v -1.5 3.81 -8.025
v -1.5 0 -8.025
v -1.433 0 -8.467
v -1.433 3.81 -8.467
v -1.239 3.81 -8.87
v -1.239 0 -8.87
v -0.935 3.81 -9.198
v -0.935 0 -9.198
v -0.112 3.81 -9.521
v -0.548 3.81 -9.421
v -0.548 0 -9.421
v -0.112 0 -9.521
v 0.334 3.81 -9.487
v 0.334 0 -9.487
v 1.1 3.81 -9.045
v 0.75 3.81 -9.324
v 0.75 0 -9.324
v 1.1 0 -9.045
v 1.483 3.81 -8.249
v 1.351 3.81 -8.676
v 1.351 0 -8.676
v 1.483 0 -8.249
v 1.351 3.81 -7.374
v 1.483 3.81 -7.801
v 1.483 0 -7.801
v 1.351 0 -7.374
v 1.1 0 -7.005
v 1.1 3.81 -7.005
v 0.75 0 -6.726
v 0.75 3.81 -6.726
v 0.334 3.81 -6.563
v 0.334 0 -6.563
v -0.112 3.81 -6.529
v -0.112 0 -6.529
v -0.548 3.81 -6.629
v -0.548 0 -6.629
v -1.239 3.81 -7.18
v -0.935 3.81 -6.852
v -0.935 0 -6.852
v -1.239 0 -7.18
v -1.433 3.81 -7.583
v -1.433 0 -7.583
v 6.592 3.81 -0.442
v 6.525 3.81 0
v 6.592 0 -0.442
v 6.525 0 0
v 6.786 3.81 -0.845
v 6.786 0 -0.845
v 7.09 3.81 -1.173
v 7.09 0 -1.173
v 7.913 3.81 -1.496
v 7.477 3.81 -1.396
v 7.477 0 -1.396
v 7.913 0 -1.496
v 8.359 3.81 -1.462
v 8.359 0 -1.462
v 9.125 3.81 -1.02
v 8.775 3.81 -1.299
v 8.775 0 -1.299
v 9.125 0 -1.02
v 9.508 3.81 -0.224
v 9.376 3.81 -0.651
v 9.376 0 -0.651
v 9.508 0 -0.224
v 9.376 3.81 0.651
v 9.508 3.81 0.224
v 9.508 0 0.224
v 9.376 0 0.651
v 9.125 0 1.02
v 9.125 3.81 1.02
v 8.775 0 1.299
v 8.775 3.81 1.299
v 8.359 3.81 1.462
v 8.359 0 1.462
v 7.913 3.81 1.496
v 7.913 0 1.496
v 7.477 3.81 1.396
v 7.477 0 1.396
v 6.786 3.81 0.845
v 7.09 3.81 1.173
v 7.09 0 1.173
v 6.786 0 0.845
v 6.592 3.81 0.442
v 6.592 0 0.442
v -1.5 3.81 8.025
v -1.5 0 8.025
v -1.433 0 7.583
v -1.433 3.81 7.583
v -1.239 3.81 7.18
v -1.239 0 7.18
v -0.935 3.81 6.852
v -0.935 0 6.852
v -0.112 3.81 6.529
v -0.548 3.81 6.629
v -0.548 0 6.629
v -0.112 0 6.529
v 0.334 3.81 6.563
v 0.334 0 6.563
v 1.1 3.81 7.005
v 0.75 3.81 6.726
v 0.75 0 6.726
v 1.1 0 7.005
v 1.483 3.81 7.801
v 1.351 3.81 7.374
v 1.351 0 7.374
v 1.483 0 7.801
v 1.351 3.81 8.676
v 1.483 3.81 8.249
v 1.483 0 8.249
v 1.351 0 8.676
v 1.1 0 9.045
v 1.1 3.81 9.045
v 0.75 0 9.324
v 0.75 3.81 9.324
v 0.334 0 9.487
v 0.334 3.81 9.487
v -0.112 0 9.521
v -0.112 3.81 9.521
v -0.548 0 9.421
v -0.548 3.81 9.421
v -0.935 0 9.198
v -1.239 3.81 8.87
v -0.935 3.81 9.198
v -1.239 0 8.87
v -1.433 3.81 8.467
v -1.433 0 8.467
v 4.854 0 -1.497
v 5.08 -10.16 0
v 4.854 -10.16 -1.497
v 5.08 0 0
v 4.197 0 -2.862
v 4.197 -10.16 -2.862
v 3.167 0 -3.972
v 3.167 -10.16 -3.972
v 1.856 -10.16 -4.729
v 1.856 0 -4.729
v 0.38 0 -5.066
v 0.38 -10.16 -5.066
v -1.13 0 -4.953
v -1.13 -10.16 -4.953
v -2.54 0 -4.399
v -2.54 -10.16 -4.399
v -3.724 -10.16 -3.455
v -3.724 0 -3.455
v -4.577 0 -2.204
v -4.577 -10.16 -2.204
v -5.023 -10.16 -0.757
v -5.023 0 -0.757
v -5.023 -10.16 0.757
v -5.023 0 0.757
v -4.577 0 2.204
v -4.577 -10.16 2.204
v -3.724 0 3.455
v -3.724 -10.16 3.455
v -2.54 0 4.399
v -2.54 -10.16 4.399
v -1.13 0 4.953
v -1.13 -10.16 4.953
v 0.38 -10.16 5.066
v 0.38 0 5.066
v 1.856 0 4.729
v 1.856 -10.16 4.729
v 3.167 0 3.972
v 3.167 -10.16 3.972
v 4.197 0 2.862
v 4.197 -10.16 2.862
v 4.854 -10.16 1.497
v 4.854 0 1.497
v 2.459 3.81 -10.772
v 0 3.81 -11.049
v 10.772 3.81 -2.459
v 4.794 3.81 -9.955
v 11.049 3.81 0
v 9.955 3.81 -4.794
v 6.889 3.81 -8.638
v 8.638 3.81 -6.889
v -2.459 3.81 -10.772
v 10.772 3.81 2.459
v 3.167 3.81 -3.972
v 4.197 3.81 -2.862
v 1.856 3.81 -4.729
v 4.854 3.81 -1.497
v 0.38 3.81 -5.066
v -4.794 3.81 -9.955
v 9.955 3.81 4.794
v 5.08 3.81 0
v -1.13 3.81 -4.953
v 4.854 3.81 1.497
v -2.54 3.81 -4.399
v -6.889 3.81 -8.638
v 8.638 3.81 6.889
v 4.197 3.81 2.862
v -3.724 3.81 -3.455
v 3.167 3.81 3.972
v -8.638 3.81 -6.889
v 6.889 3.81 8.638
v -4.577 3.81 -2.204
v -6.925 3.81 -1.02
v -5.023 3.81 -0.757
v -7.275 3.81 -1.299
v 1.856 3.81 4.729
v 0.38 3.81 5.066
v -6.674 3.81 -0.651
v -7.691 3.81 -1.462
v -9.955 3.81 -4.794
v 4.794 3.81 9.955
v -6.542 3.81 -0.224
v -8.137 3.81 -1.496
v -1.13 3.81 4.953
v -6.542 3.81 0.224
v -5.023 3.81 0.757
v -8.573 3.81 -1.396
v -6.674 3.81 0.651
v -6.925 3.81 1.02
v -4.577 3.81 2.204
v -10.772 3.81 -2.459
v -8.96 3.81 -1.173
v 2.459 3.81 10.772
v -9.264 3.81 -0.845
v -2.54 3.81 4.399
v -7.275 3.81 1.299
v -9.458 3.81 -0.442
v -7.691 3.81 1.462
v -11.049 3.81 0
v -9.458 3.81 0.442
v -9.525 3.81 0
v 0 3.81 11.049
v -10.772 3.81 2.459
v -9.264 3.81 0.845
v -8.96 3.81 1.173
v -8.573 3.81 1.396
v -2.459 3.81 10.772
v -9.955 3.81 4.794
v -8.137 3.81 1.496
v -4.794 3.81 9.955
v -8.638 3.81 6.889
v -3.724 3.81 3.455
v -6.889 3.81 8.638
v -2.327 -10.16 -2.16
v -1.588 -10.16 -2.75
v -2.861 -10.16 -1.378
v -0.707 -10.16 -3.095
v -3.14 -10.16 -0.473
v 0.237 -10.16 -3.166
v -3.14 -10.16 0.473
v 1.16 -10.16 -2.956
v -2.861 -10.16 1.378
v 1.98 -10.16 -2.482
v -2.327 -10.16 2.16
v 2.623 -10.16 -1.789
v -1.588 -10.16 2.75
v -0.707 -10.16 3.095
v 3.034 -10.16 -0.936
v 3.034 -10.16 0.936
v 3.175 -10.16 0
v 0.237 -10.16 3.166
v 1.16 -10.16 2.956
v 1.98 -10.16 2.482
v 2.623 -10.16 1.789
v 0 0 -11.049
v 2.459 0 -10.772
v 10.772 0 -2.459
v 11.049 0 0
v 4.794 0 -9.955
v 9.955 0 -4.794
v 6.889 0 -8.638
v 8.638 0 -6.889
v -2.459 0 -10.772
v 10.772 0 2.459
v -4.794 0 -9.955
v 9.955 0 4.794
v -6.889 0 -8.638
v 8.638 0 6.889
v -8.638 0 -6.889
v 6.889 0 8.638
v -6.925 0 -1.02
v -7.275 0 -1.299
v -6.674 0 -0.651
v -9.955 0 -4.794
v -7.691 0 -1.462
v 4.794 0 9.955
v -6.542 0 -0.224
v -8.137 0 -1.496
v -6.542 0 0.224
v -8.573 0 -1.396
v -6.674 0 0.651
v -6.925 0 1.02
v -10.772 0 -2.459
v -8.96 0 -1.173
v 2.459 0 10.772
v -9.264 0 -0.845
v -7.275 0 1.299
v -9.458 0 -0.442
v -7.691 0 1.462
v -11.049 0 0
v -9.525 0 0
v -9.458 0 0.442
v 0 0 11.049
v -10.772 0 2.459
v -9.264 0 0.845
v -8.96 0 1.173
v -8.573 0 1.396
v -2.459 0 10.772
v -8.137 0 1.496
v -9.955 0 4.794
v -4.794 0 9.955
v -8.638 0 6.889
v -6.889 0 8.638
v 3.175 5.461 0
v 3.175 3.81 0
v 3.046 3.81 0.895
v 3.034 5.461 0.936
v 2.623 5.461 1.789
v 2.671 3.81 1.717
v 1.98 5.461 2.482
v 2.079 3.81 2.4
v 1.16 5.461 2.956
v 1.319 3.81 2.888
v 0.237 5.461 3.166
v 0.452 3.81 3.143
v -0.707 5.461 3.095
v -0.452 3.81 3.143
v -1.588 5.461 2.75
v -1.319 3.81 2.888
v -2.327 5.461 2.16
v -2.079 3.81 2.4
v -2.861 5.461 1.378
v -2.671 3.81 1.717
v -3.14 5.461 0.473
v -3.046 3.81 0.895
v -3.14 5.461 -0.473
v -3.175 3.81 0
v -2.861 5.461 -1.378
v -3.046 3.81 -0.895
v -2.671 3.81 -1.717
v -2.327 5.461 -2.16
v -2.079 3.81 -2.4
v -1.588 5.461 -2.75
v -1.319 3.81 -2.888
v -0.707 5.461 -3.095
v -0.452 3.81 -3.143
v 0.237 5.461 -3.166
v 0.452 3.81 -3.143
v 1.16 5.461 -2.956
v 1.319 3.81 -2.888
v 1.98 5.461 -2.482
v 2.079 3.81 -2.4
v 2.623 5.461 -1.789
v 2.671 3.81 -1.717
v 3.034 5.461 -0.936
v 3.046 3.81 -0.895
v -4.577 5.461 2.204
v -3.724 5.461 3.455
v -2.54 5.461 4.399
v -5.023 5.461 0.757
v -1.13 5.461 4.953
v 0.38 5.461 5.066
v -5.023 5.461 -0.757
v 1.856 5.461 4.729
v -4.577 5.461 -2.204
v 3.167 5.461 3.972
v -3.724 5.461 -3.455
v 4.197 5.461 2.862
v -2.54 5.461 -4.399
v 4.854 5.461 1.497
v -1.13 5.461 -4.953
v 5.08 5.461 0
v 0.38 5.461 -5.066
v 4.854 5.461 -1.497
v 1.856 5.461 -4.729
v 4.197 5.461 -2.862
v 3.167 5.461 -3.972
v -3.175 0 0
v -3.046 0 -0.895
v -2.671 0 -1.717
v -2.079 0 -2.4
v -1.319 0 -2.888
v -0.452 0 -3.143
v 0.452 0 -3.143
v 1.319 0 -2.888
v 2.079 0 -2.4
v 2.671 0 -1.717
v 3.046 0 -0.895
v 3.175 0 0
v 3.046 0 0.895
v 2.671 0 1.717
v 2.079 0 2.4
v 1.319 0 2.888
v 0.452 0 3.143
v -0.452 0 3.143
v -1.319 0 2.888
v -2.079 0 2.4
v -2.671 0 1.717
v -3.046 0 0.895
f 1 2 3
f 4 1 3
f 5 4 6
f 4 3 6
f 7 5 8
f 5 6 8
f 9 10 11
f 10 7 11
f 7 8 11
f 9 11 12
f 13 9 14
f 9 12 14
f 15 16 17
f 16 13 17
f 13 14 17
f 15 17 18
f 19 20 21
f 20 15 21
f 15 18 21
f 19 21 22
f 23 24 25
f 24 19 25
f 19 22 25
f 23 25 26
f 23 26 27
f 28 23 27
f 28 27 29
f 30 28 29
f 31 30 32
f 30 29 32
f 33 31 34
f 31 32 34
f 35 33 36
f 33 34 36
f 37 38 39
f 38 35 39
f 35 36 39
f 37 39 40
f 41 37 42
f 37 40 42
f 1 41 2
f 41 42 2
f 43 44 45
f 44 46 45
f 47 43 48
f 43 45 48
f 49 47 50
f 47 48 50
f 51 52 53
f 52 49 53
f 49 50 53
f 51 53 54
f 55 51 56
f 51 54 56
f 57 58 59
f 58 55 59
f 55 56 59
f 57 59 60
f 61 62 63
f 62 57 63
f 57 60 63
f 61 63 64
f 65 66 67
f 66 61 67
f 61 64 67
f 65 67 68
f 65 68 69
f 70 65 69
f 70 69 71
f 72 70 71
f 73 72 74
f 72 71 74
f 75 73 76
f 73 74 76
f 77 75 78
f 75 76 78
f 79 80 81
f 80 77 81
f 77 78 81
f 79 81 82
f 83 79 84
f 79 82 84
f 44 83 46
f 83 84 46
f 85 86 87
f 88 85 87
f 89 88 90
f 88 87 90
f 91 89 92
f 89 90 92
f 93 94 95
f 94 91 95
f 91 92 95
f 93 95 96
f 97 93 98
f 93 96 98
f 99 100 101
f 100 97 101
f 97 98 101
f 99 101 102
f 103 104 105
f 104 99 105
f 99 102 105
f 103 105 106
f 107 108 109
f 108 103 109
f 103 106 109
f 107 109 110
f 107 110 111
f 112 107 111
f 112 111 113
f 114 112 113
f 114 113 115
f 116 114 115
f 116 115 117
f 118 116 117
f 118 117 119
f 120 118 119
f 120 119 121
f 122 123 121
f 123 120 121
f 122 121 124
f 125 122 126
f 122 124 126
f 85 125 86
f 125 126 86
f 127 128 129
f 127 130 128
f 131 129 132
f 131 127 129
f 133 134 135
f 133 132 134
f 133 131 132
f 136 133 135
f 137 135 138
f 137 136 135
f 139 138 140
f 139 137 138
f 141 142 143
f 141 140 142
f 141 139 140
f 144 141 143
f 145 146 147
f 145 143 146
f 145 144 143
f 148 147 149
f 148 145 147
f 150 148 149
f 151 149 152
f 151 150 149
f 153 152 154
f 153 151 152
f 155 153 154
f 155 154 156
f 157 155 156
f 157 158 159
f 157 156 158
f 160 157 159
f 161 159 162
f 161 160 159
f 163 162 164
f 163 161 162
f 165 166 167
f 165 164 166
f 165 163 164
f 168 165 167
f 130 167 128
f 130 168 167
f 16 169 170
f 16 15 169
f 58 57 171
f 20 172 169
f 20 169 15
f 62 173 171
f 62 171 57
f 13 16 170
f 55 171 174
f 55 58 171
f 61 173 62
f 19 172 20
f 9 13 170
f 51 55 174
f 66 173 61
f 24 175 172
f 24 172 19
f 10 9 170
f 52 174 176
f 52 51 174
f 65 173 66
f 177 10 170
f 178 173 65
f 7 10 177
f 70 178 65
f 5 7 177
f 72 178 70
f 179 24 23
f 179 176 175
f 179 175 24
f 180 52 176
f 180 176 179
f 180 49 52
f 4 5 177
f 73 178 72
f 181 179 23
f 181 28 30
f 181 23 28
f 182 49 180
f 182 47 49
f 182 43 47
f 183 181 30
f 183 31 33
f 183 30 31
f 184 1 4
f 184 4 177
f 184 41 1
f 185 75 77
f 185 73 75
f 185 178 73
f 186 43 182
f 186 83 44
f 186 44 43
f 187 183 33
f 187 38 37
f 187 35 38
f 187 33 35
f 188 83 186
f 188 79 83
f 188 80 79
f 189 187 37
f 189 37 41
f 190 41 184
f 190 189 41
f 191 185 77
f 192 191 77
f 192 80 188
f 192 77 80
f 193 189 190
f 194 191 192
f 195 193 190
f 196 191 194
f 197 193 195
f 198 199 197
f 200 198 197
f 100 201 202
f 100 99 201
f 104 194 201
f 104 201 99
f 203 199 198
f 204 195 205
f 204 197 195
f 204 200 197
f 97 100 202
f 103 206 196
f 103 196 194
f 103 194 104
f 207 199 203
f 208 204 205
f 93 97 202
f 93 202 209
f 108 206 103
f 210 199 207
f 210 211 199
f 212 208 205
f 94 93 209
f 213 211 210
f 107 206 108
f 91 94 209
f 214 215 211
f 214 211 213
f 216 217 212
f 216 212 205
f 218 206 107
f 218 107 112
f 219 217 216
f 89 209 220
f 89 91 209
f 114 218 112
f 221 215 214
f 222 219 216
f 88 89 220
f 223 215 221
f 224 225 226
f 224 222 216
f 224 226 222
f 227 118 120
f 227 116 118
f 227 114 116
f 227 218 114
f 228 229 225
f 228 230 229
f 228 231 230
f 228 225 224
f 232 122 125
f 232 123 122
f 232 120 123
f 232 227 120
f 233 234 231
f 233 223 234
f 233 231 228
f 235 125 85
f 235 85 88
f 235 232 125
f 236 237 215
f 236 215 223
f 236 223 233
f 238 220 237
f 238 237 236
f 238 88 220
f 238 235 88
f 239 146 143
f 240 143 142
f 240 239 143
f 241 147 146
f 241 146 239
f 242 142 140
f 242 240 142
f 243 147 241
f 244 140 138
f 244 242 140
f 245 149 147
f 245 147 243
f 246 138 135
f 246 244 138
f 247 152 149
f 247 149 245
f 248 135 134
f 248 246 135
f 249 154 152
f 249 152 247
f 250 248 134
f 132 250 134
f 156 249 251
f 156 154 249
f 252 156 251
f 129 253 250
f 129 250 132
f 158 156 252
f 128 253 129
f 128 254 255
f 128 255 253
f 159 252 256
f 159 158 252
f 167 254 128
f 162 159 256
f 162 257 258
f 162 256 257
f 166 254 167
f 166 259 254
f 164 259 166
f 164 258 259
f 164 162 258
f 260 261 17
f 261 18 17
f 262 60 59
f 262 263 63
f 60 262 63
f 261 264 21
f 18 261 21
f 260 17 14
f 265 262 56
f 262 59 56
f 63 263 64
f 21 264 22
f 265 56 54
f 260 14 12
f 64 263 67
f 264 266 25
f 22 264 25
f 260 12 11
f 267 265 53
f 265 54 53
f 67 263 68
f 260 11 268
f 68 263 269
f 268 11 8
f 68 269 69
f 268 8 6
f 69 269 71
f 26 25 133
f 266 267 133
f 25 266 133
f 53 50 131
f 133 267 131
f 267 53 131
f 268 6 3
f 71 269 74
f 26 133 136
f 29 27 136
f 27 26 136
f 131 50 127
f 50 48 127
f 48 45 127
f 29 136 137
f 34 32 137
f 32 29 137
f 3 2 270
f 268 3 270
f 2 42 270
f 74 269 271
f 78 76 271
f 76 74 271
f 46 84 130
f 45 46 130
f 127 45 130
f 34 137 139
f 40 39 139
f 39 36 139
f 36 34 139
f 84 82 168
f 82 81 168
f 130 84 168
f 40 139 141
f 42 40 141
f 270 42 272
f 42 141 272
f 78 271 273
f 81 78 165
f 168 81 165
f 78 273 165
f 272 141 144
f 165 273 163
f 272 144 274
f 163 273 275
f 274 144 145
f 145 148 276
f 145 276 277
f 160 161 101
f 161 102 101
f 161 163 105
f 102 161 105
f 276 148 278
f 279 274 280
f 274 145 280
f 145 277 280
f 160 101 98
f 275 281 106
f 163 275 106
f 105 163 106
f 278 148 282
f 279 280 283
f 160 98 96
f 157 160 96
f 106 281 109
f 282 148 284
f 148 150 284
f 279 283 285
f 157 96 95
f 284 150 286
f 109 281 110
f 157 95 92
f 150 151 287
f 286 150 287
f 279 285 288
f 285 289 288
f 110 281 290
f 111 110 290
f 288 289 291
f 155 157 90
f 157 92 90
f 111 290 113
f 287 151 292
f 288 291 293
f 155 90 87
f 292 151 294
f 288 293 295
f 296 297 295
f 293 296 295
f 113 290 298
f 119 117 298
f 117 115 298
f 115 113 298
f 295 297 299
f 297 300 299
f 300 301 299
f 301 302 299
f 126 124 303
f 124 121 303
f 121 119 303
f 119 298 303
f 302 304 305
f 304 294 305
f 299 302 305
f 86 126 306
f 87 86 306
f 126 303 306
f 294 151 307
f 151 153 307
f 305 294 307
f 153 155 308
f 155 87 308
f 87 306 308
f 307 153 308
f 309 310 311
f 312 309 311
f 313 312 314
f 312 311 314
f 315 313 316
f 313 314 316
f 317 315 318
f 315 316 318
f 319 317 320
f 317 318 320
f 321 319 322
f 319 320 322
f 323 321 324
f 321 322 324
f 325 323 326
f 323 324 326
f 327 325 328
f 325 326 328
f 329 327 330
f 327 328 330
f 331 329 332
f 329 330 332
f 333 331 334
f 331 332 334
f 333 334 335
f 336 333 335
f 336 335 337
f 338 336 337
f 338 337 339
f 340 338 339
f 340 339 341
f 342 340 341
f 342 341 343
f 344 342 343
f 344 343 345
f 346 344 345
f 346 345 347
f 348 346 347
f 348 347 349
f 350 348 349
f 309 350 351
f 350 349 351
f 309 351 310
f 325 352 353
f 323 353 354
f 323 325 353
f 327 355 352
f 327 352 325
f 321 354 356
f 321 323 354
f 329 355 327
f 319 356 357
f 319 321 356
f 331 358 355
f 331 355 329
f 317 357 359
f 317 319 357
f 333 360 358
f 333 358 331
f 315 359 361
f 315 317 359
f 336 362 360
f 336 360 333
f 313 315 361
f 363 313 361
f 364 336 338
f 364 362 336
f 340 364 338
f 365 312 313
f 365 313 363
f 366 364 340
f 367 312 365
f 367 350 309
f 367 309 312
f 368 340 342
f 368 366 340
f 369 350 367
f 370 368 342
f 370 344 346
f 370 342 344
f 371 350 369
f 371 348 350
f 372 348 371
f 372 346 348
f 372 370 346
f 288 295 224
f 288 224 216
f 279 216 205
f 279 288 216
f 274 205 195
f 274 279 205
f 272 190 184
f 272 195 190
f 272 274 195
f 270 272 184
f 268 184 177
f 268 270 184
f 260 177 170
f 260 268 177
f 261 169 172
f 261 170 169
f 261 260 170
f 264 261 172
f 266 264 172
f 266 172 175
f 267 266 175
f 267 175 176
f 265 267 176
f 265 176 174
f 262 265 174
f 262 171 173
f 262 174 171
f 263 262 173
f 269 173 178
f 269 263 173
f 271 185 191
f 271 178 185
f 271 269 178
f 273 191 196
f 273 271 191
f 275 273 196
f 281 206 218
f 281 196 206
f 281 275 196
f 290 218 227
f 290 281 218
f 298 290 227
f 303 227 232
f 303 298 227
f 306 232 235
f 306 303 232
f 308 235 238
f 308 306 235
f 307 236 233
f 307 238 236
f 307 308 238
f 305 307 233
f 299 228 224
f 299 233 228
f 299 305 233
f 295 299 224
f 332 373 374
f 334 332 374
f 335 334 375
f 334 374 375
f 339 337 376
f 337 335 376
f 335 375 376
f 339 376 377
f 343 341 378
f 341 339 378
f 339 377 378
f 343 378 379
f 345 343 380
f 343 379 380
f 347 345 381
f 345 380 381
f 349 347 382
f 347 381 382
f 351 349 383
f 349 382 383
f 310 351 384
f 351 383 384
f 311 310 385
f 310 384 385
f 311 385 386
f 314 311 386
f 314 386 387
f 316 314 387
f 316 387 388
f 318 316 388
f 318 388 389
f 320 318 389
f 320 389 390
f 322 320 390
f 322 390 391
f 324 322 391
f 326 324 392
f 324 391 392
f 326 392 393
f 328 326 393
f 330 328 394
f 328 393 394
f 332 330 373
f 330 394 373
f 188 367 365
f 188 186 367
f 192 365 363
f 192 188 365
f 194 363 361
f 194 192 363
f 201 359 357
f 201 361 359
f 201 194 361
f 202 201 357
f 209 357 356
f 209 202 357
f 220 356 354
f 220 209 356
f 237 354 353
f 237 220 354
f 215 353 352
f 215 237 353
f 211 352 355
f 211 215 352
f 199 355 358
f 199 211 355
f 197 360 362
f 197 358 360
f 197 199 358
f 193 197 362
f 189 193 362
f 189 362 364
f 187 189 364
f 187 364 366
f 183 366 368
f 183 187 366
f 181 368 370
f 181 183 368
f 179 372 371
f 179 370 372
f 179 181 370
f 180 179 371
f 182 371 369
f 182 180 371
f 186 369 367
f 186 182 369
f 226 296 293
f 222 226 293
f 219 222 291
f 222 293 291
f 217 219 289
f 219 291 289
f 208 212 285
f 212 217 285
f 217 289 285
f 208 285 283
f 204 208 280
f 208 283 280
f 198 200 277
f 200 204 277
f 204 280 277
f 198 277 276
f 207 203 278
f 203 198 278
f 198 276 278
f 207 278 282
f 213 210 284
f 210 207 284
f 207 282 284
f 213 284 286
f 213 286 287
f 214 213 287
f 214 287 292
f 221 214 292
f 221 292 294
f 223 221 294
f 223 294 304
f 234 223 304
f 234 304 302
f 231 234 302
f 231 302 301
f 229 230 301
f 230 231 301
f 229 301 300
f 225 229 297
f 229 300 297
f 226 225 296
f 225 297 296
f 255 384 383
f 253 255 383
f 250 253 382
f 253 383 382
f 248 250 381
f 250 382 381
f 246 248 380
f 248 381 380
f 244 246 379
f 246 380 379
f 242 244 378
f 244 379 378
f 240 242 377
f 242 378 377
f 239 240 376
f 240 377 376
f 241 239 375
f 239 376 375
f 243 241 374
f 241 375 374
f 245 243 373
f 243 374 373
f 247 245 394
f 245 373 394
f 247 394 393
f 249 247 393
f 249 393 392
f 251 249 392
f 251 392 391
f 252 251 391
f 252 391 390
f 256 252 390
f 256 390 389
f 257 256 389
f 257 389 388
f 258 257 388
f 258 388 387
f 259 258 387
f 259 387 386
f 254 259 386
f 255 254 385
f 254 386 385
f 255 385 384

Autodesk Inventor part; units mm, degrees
ref_plane "YZ Plane" through (0, 0, 0) normal (1, 0, 0) x (0, 1, 0)
ref_plane "XZ Plane" through (0, 0, 0) normal (0, 1, 0) x (-1, 0, 0)
ref_plane "XY Plane" through (0, 0, 0) normal (0, 0, 1) x (1, 0, 0)
sketch "Sketch1" plane through (0, 0, 0) normal (0, 1, 0) x (-1, 0, 0)
  circle A0 centre (0, 0) radius 11.049
  circle A1 centre (0, 0) radius 3.175
  circle A2 centre (8.025, 0) radius 1.5
  line L0 (9.525, 0) -> (11.049, 0)
  circle A3 centre (0, 0) radius 5.08
  circle A4 centre (0, 8.025) radius 1.5
  circle A5 centre (-8.025, 0) radius 1.5
  circle A6 centre (0, -8.025) radius 1.5
  point P0 (0, 9.525)
  point P1 (-9.525, 0)
  point P2 (0, -9.525)
  dimension "d0" = 22.098
  dimension "d2" = 3
  dimension "d1" = 6.35
  dimension "d3" = 1.524
  dimension "d4" = 10.16
  dimension "d7" = 360
extrude "Extrusion1" add sketch "Sketch1" along normal blind 3.81 contours A0 | A3
sketch "Sketch2" plane through (0, 3.81, 0) normal (0, 1, 0) x (1, 0, 0)
  circle A0 centre (0, 0) radius 5.08
  circle A1 centre (0, 0) radius 3.175
  dimension "d11" = 10.16
extrude "Extrusion2" add sketch "Sketch2" along normal blind 1.651
sketch "Sketch3" plane through (0, 0, 0) normal (0, -1, 0) x (1, 0, 0)
  circle A0 centre (0, 0) radius 5.08 projected
  circle A1 centre (0, 0) radius 5.08 projected
  circle A2 centre (0, 0) radius 3.175 projected
extrude "Extrusion3" add sketch "Sketch3" along normal blind 10.16
thread "Thread1" size "1/4-20 UNC" class "2B" standard "ANSI Unified Screw Threads" full length
properties part number "Threaded Rod Mount"
